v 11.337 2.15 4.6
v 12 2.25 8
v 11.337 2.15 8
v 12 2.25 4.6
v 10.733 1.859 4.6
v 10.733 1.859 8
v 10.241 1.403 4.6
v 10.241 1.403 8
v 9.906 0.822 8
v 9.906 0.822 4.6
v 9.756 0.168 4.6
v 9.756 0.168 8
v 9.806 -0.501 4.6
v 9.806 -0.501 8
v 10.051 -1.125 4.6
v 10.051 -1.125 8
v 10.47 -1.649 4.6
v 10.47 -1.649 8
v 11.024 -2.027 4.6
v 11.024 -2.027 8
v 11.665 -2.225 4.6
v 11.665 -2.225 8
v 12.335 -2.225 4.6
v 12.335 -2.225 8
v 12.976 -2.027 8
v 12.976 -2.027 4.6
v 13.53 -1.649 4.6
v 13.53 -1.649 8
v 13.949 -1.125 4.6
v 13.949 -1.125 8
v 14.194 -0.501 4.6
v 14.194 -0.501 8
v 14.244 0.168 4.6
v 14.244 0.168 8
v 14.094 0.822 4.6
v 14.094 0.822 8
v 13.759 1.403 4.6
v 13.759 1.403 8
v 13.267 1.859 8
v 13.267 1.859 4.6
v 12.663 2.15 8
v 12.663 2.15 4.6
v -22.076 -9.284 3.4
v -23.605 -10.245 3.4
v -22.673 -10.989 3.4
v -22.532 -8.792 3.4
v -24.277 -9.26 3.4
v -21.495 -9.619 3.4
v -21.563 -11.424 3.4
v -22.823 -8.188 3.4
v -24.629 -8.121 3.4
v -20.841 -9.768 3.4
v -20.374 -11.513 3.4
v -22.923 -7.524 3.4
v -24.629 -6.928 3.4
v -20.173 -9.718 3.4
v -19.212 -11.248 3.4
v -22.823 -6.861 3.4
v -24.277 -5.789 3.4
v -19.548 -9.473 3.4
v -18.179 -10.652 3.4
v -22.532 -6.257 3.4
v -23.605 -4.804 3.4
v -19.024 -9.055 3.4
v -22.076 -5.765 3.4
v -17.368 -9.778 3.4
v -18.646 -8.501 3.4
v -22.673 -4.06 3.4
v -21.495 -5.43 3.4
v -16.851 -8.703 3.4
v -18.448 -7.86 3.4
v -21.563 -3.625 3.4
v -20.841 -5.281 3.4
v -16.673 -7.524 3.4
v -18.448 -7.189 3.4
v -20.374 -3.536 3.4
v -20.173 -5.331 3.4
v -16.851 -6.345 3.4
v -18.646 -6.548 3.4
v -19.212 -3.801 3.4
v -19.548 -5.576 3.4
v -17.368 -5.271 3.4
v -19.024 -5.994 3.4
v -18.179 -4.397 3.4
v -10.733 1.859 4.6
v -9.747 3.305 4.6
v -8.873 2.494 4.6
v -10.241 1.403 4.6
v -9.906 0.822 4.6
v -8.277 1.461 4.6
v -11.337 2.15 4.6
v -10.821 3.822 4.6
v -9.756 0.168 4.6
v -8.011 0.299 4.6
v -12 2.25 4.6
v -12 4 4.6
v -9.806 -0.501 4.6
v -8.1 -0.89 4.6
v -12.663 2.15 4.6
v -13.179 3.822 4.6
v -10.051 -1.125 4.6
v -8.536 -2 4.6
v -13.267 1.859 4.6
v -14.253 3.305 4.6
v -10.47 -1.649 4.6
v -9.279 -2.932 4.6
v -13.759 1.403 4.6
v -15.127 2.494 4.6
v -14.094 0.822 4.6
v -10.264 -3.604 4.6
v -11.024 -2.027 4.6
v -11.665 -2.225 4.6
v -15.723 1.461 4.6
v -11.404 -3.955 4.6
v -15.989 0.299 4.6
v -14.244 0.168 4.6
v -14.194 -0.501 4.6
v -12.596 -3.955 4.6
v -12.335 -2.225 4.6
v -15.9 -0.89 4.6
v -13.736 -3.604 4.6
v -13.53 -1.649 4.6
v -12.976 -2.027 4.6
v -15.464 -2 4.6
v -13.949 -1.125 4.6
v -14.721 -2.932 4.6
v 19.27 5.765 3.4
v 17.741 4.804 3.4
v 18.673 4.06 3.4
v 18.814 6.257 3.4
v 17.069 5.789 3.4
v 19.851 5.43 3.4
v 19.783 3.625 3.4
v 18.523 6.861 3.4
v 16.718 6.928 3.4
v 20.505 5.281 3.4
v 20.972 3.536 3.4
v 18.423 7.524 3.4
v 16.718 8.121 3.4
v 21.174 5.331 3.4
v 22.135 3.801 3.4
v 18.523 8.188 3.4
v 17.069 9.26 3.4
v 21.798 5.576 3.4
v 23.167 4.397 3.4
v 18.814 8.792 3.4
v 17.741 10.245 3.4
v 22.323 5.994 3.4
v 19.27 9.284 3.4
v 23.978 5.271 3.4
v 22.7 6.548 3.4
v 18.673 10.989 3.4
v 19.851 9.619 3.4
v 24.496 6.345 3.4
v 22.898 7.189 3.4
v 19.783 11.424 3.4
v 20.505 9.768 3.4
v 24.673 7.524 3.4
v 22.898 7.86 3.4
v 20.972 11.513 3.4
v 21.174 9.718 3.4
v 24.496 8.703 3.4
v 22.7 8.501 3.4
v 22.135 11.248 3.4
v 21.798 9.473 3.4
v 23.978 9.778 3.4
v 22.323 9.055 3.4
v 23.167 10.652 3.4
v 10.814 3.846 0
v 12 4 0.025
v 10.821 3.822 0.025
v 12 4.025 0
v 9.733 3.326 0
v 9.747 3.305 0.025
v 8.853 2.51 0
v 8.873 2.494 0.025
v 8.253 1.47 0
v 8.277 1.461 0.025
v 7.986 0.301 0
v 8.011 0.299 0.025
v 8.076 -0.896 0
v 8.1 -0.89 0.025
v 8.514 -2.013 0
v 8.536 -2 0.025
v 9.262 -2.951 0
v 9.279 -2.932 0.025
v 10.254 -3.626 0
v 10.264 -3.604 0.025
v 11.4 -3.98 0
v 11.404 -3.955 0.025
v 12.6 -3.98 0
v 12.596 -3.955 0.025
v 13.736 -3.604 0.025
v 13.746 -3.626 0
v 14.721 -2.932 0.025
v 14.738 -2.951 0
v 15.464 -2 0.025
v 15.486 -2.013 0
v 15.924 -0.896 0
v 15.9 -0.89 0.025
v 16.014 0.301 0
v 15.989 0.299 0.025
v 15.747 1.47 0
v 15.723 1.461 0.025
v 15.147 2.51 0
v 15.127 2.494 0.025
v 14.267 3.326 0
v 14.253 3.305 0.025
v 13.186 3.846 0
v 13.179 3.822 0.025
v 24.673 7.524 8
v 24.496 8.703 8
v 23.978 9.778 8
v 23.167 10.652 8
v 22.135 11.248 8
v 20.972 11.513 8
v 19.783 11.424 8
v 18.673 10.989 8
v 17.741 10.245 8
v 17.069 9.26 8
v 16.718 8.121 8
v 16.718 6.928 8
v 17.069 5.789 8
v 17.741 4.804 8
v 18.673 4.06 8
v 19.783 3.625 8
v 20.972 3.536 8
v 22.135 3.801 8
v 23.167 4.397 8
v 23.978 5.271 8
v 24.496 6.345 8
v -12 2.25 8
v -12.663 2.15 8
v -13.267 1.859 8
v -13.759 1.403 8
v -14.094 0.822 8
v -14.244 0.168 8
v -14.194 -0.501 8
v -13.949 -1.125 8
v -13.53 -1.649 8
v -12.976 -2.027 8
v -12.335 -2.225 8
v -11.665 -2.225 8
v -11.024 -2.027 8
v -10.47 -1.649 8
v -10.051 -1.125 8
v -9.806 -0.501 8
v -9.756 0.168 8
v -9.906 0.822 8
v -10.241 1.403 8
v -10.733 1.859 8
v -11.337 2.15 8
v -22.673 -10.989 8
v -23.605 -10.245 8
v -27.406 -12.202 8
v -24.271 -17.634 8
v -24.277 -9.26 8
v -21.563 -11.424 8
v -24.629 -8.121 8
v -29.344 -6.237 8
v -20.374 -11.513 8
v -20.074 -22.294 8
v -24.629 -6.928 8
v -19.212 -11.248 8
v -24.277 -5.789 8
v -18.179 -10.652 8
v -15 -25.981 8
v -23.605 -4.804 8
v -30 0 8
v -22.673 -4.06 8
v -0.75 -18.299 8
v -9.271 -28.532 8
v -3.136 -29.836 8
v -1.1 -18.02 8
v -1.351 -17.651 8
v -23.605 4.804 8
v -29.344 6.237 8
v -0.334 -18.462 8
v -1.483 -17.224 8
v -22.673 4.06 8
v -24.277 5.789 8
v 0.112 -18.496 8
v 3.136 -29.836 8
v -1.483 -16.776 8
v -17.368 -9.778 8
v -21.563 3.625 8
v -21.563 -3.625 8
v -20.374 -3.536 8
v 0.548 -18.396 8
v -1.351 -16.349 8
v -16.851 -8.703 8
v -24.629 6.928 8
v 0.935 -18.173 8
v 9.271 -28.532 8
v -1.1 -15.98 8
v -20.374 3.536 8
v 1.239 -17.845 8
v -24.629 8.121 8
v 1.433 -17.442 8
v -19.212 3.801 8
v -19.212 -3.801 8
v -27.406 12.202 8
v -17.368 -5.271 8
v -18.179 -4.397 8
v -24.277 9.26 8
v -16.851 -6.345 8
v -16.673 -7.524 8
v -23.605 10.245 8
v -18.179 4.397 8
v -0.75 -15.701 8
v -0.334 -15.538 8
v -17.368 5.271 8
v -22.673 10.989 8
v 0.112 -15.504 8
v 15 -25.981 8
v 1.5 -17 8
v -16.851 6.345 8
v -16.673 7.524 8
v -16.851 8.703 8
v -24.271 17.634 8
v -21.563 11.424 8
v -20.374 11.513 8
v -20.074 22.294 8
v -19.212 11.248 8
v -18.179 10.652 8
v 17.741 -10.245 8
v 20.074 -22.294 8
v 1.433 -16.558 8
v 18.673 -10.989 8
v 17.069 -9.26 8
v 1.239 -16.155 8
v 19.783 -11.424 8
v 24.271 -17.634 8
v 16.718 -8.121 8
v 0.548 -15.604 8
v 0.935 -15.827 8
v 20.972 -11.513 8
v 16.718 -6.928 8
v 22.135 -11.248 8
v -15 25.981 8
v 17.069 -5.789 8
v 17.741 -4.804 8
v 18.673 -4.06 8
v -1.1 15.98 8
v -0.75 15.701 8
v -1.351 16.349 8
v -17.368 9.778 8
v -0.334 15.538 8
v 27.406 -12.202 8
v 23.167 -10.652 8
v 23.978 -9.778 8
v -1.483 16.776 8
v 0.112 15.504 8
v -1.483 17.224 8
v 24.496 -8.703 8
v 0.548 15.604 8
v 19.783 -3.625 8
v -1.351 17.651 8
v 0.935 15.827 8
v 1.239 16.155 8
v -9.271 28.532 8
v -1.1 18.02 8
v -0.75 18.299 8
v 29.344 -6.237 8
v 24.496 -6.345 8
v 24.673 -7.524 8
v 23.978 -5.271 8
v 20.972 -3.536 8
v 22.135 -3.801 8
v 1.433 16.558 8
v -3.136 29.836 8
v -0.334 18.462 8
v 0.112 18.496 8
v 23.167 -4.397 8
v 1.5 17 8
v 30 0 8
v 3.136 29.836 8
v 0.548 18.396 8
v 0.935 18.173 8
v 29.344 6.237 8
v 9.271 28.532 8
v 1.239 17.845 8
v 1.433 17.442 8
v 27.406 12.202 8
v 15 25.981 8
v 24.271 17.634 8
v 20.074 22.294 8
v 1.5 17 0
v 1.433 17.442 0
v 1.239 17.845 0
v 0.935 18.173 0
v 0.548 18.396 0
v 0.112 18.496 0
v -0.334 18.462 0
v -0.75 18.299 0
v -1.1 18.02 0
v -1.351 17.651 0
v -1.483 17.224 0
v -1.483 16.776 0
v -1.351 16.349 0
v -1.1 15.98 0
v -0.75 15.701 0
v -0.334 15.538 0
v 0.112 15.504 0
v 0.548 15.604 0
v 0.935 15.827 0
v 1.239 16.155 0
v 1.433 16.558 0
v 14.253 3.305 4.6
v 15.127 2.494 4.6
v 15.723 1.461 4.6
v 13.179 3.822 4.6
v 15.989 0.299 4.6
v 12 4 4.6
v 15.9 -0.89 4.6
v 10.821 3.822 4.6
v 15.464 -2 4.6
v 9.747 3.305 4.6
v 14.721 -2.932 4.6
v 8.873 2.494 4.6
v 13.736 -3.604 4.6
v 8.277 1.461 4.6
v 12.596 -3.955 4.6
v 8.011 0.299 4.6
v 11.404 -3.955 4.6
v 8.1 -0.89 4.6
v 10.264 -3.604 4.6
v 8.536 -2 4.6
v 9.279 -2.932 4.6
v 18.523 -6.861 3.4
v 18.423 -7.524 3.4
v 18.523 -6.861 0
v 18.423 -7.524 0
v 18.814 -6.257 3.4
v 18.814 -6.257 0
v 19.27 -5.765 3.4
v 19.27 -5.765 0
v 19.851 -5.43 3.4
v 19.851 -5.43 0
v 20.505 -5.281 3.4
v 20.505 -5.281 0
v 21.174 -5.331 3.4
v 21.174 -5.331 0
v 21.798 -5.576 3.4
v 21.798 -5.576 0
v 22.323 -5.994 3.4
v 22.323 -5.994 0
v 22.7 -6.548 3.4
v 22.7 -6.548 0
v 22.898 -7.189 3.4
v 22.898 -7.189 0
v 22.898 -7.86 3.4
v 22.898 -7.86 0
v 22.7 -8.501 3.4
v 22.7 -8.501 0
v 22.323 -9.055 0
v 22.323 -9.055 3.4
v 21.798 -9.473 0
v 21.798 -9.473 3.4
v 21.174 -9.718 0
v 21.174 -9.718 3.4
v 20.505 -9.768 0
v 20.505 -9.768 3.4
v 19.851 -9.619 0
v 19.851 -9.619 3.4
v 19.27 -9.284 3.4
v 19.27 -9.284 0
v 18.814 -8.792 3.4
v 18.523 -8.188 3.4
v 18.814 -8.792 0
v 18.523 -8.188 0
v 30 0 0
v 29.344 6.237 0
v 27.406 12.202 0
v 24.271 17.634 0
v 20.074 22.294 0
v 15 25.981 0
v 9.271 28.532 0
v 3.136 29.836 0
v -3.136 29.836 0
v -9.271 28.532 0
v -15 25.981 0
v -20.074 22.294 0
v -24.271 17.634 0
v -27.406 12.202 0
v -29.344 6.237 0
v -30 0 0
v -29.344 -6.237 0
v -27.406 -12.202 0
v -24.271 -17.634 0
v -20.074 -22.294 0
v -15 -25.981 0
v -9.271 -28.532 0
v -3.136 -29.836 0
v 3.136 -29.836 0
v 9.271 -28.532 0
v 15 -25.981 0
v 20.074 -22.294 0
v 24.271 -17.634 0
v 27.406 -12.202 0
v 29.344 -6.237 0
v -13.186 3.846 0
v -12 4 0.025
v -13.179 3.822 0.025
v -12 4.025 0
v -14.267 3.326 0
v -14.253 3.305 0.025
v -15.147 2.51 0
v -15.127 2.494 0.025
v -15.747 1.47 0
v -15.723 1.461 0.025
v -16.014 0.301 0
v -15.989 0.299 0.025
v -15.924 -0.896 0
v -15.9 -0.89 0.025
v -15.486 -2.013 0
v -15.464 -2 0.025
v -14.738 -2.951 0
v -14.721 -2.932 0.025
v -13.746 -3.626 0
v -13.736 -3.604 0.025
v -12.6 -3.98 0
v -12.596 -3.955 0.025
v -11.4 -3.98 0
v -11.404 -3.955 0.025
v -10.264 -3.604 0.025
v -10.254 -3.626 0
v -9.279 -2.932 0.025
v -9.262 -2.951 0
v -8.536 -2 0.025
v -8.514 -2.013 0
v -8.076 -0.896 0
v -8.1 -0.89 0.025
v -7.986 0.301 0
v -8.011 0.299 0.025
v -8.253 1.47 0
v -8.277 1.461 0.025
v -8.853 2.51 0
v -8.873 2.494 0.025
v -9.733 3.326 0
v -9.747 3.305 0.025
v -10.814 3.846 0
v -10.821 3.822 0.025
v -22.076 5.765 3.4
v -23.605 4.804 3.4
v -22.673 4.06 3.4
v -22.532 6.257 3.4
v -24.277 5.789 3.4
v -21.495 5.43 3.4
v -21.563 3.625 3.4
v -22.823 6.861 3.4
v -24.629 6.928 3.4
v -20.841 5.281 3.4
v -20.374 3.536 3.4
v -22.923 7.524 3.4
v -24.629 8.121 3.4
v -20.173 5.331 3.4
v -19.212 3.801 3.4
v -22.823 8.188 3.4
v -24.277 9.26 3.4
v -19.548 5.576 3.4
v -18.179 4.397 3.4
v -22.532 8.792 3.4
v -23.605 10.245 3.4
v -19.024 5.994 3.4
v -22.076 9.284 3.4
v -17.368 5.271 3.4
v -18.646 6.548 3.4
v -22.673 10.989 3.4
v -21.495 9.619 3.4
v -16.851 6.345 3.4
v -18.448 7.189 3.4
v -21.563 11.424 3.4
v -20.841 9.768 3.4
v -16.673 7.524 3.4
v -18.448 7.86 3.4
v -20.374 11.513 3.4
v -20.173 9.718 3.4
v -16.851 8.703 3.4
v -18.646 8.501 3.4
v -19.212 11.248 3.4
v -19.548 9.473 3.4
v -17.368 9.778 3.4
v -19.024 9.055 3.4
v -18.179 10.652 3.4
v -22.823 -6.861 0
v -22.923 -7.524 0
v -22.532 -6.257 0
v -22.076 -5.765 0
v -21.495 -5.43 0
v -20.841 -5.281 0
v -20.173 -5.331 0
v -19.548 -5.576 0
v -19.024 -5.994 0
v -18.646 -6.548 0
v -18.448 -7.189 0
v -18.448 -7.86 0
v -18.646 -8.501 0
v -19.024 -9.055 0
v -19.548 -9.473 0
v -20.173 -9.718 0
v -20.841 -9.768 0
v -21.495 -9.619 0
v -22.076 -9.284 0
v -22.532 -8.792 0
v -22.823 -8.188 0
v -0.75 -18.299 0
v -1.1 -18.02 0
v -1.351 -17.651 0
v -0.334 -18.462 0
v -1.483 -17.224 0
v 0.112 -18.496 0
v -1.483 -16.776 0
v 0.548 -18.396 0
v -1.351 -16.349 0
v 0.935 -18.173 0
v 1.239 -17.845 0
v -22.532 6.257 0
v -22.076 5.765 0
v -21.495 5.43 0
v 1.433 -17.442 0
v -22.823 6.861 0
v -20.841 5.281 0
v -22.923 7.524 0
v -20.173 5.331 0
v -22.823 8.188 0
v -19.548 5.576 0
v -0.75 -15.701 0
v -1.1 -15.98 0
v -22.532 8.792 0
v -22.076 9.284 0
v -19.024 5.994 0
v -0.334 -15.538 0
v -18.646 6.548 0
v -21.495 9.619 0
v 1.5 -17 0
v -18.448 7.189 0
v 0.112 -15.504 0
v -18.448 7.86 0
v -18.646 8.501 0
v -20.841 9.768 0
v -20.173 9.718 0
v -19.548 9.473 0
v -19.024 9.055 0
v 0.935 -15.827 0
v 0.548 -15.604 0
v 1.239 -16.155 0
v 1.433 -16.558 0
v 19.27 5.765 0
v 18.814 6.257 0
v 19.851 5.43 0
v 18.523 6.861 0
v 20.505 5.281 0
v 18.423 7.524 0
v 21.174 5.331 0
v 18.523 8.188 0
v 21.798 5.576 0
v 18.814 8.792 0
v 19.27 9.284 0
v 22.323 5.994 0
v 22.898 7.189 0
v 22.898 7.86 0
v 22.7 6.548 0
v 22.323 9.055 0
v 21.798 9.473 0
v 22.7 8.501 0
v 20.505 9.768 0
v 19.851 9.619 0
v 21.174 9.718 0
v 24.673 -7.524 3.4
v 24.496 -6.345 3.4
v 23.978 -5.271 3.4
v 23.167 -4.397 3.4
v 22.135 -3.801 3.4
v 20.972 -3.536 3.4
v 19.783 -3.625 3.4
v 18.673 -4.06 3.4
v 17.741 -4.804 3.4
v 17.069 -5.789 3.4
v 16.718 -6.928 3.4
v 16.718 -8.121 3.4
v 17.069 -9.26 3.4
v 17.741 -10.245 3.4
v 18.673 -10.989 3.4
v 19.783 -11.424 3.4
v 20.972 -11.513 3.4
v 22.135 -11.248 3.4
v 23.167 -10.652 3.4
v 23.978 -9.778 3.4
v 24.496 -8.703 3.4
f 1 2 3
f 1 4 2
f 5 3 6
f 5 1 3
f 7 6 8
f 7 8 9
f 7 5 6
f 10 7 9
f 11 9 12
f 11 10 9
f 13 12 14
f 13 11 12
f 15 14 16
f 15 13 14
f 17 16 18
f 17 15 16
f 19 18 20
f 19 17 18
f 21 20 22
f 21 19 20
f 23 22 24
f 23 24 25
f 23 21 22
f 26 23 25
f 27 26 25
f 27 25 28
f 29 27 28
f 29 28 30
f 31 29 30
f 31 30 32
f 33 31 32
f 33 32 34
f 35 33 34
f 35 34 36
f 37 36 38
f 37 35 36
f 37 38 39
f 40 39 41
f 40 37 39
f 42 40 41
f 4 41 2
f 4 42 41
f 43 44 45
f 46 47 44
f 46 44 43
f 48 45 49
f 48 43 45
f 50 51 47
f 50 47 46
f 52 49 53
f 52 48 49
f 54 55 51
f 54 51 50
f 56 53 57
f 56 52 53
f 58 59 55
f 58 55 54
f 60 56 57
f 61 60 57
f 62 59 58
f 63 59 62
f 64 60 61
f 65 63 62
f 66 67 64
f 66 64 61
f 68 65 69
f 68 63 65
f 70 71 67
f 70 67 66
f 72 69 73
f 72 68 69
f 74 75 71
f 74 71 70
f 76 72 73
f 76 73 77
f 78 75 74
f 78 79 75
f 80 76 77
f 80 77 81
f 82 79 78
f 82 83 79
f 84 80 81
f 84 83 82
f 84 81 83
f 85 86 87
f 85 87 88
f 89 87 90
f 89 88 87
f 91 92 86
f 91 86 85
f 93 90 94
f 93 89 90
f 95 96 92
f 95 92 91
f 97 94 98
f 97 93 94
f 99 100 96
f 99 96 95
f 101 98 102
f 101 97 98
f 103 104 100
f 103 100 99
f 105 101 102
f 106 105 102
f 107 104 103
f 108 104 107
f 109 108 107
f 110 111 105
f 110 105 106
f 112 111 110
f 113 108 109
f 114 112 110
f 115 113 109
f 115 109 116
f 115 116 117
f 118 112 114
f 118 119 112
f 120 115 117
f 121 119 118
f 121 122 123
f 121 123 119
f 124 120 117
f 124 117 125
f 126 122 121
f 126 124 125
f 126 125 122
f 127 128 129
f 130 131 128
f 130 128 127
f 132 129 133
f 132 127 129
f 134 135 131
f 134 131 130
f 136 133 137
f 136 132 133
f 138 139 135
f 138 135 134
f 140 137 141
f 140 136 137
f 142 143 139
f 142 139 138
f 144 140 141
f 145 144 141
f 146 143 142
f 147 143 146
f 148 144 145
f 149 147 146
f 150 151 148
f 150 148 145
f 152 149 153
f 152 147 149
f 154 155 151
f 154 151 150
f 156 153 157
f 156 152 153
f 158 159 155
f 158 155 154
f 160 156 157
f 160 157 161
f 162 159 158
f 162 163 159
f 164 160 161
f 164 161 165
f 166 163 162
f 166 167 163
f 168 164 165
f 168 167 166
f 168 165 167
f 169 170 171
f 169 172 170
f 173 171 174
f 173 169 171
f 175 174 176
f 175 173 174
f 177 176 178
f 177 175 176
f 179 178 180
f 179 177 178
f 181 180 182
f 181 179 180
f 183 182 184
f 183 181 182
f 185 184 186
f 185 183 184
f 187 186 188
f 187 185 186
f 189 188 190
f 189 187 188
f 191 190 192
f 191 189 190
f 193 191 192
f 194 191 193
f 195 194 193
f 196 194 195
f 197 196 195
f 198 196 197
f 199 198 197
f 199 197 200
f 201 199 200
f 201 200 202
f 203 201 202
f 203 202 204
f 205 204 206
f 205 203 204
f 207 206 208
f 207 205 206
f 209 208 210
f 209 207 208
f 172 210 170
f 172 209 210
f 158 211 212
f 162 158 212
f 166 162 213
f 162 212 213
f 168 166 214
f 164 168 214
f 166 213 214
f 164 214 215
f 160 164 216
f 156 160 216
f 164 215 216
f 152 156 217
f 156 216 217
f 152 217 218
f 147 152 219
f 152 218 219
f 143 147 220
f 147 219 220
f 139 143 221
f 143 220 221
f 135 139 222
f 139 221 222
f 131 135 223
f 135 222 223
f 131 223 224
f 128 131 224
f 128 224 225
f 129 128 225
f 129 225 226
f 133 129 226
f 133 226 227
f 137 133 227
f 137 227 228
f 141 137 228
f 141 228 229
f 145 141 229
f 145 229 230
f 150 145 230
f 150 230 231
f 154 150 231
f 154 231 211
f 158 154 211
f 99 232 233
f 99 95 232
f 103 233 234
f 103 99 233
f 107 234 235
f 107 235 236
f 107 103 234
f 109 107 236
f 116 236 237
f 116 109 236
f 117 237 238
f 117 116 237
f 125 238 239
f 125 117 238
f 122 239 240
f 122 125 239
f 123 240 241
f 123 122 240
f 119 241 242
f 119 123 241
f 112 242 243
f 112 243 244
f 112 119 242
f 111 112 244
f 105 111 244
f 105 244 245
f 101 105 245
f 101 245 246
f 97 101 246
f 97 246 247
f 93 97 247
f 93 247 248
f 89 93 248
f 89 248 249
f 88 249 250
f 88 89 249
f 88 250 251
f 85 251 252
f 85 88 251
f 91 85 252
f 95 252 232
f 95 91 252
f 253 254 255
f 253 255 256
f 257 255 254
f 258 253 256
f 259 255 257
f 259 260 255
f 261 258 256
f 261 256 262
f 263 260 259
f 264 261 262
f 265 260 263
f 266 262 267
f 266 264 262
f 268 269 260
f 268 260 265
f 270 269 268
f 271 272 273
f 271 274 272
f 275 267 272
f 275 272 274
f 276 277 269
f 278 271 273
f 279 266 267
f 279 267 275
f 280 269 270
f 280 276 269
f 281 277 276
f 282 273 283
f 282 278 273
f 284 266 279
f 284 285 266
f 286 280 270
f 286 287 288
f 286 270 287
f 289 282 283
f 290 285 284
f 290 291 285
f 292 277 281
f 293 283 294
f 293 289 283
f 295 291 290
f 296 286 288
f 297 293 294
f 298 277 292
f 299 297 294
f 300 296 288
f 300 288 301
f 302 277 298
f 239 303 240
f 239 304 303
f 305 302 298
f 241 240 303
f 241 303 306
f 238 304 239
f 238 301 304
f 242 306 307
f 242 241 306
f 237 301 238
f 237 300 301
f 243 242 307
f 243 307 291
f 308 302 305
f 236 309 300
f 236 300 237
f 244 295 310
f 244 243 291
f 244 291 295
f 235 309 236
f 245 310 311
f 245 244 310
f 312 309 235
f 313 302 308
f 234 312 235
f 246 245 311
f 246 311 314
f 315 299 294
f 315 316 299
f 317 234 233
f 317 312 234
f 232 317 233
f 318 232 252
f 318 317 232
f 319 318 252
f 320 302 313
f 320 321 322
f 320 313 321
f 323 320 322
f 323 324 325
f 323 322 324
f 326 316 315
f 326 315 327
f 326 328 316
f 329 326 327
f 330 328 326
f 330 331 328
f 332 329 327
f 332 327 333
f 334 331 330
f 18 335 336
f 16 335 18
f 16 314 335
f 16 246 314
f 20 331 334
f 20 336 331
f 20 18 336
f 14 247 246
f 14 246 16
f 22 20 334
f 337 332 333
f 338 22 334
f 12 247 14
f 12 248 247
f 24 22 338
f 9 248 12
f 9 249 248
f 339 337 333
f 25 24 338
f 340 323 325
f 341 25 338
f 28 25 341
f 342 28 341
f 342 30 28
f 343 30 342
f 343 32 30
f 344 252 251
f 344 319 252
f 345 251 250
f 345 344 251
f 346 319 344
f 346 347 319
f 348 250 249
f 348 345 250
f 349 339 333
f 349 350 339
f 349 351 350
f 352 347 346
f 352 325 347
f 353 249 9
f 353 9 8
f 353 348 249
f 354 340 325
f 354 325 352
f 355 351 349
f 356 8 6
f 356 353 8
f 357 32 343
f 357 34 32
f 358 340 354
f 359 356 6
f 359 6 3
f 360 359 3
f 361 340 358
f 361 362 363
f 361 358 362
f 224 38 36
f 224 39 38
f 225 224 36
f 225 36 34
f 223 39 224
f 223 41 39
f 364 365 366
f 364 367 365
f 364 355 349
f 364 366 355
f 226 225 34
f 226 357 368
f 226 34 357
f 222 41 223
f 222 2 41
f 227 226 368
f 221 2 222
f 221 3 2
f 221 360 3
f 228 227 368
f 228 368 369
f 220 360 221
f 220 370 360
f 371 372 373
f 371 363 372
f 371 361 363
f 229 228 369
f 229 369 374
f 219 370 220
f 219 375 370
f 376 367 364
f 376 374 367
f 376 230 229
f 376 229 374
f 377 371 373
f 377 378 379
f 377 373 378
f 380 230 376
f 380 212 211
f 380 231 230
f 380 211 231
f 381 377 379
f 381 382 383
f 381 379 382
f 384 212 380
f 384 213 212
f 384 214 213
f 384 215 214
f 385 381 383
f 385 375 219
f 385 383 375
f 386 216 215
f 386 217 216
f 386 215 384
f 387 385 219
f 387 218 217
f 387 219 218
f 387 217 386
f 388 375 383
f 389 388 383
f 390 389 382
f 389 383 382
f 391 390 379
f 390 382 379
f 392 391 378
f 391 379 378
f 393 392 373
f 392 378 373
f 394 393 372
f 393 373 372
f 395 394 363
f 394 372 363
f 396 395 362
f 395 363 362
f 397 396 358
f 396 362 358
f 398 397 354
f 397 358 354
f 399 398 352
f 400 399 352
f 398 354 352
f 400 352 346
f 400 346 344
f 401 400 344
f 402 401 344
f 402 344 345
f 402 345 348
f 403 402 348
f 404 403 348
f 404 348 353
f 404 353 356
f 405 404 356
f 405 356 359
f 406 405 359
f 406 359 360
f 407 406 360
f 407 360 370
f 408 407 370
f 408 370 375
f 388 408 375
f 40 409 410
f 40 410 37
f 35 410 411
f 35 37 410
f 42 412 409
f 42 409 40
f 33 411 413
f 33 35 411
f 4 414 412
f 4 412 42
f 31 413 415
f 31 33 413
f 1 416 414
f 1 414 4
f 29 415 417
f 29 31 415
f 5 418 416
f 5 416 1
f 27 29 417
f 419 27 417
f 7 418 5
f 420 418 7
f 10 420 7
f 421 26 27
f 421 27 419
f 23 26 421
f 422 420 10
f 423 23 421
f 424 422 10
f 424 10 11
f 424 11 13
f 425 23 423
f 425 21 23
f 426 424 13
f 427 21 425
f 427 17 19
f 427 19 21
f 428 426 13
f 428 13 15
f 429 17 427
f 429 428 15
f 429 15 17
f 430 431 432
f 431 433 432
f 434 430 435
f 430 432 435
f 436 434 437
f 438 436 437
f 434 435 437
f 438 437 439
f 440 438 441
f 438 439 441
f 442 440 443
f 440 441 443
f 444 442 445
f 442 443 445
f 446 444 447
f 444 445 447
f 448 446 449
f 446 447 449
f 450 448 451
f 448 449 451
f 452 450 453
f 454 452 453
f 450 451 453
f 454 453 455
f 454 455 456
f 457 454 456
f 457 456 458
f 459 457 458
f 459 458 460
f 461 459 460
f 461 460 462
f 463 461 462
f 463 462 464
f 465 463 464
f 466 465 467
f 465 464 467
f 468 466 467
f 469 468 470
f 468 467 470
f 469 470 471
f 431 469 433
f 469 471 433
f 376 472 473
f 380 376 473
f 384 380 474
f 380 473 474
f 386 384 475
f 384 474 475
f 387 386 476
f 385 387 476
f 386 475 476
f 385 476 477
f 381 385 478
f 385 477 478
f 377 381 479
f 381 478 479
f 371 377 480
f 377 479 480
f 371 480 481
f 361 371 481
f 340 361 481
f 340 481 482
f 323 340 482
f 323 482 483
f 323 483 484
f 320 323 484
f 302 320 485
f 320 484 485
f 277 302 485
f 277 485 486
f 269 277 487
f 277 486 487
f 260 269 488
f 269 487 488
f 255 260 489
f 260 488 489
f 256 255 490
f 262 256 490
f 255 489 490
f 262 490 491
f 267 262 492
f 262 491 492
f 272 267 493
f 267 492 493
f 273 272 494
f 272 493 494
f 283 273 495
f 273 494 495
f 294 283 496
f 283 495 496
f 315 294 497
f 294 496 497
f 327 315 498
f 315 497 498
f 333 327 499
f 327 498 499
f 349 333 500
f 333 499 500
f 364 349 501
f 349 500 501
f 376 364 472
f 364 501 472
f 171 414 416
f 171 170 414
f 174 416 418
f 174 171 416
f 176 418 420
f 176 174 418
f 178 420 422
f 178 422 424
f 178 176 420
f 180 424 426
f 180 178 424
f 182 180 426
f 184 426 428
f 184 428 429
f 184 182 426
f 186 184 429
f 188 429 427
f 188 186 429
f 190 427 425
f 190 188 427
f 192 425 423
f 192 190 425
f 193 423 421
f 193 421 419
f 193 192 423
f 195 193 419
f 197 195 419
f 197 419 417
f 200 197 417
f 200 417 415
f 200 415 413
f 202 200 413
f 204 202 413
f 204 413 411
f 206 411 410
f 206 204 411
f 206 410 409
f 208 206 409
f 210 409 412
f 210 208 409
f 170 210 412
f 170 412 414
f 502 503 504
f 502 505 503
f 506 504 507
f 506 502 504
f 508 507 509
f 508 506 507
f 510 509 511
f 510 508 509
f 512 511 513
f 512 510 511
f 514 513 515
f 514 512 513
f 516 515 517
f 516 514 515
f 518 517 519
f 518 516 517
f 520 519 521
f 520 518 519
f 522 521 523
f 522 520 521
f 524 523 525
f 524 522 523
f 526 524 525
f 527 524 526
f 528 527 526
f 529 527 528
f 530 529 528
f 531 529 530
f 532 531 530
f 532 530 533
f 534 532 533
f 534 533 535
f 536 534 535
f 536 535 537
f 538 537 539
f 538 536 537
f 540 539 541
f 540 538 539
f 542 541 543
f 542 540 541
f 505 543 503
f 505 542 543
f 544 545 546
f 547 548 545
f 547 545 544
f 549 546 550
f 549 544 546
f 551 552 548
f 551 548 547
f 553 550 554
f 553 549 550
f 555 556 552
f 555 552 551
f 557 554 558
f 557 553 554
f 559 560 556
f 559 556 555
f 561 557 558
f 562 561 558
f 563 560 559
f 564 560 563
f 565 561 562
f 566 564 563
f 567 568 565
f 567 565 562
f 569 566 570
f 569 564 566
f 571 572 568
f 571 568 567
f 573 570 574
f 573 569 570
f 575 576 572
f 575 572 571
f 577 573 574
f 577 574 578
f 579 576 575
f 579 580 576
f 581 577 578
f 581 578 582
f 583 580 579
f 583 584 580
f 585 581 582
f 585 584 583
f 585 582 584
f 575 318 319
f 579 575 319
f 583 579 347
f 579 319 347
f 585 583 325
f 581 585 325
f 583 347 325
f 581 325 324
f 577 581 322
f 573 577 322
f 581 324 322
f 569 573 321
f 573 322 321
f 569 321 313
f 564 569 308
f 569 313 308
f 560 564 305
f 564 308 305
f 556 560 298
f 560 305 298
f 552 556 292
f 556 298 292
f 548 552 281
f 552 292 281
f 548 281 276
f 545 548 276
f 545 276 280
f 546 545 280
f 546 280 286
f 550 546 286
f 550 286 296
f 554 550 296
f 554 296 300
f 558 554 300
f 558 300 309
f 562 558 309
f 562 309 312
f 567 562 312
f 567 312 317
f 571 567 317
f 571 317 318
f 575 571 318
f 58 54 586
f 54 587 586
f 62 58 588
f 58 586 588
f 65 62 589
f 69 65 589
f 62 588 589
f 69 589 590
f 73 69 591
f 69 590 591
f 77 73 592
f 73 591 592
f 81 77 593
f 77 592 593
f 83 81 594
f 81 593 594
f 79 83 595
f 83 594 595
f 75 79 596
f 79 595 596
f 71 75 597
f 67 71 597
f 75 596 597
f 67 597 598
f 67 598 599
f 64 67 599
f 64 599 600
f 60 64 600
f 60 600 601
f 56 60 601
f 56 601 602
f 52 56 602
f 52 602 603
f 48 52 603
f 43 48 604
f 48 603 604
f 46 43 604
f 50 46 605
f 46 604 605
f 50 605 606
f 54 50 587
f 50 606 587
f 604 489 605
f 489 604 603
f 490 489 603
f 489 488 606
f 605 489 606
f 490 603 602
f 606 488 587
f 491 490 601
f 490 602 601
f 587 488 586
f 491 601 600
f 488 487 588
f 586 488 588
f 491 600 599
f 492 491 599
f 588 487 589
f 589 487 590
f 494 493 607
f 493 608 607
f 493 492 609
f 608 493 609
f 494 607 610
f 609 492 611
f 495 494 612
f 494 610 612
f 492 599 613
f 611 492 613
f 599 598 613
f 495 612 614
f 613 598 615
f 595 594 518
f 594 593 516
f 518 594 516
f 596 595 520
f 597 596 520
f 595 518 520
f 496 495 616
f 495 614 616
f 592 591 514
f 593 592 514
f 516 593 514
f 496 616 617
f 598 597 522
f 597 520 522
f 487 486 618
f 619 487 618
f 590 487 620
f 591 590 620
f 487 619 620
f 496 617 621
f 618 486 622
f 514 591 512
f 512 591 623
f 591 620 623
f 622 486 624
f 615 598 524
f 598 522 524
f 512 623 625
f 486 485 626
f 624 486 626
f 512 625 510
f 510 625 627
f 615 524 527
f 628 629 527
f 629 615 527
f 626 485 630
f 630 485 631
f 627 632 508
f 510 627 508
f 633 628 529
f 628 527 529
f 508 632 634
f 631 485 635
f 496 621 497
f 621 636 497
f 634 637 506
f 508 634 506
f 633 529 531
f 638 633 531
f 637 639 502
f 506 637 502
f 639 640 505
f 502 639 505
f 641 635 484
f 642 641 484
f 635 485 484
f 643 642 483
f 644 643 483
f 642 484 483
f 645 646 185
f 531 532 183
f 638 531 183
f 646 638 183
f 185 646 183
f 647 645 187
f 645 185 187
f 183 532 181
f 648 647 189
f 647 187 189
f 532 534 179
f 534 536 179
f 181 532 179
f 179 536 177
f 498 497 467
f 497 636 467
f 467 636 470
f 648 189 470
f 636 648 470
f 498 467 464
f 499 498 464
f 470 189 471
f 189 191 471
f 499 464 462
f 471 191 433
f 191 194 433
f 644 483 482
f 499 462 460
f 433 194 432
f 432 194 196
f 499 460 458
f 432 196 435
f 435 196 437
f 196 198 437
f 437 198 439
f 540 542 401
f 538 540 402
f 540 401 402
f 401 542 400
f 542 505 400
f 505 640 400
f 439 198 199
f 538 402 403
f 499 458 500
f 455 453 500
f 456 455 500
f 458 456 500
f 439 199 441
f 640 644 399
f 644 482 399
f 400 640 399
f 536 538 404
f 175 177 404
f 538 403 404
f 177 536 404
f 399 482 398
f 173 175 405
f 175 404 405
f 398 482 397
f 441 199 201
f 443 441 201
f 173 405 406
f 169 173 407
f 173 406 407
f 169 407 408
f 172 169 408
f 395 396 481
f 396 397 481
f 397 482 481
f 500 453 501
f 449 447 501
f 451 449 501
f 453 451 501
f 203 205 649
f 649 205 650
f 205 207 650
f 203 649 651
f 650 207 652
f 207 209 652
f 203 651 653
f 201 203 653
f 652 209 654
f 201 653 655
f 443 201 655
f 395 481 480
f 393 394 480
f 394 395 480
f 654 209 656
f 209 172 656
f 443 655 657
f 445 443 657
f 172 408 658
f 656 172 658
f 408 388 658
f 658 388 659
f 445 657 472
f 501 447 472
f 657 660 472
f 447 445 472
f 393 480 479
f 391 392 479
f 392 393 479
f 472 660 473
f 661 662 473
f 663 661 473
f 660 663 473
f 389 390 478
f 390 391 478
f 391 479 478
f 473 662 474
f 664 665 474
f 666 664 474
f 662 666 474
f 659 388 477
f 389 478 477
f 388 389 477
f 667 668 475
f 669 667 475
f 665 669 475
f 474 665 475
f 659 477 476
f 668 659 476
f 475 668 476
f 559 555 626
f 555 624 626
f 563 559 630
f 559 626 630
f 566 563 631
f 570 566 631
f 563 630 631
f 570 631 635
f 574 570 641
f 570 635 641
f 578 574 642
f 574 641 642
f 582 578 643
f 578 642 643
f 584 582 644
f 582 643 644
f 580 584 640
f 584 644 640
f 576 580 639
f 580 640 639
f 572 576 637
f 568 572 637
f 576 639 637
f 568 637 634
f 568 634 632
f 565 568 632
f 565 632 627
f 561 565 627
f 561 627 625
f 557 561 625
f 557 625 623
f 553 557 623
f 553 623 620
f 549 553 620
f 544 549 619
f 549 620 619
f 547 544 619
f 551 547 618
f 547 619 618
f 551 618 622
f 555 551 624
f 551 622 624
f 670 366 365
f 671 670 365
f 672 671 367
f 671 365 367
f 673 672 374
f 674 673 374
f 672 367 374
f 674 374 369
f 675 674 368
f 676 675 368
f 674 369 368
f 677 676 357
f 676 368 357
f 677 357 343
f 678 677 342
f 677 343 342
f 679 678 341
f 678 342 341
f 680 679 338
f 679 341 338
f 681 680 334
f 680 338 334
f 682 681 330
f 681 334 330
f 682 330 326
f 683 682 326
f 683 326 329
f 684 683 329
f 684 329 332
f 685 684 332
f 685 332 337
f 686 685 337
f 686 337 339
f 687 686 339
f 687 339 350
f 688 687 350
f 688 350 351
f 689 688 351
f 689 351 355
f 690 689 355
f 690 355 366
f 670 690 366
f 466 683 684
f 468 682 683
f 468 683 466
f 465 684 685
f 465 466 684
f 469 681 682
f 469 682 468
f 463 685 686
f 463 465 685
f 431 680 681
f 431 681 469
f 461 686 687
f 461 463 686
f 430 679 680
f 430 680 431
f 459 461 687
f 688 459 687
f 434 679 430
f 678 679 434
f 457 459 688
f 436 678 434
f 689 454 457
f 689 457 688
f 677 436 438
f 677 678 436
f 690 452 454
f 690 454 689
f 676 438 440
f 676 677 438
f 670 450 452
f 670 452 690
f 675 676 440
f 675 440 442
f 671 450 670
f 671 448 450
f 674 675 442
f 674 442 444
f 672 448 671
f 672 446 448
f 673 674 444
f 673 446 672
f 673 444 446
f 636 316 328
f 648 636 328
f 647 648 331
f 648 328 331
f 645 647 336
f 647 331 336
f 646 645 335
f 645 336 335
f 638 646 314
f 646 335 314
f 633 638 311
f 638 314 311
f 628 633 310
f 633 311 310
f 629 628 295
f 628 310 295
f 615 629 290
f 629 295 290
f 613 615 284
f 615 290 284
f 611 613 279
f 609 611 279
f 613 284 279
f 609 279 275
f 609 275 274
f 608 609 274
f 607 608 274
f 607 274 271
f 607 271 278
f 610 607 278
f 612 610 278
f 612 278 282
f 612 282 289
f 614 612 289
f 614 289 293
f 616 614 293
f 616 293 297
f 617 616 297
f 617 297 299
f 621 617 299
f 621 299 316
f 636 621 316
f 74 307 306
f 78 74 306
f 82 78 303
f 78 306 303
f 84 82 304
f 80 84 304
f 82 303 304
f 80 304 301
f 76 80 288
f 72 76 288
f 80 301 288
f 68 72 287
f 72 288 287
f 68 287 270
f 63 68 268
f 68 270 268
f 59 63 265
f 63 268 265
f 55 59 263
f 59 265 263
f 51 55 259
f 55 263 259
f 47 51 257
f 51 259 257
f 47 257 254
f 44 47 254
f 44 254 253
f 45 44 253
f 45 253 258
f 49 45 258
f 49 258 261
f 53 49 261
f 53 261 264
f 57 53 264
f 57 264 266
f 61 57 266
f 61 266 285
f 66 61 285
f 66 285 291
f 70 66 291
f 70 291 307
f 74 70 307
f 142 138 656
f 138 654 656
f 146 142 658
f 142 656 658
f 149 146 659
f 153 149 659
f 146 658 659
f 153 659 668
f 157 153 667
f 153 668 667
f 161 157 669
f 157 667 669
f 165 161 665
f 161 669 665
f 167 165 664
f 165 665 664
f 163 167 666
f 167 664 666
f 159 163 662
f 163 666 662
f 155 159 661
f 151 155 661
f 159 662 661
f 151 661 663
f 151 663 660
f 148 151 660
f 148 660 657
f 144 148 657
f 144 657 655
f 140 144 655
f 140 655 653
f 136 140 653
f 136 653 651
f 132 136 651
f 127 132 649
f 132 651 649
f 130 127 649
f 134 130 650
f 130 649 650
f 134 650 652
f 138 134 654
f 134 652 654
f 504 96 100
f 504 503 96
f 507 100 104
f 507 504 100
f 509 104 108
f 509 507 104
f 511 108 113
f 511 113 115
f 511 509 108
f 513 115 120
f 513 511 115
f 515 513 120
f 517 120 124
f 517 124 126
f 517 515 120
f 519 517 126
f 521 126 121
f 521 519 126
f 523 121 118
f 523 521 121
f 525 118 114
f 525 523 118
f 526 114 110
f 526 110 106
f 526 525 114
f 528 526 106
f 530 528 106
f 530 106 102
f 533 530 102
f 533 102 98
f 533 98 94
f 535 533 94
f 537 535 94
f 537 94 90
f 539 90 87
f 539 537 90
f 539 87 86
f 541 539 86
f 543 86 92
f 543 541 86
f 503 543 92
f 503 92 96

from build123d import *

# Parameters (mm, degrees)
SKETCH_1_R                = 30
EXTRUDE_1_DEPTH           = 8
HOLE_WIZARD_2_AT_2_COUNT  = 2
HOLE_WIZARD_2_AT_2_PITCH  = 24
MM_1_D                    = 3
HOLE_WIZARD_3_D           = 4.5
HOLE_WIZARD_3_CBORE_D     = 8
HOLE_WIZARD_3_CBORE_DEPTH = 4.6


with BuildPart() as part:
    # 草图1 → 凸台-拉伸1 (new body)
    with BuildSketch(Plane.XY):
        Circle(SKETCH_1_R)
    extrude(amount=EXTRUDE_1_DEPTH)

    # 草图10 → 打孔尺寸(%根据)内六角圆柱头螺钉的类型2 (revolve, cut)
    with BuildSketch(Plane.YZ.offset(12)):
        Polygon((0, 0), (0, 8), (2.25, 8), (2.25, 4.6), (4, 4.6), (4, 0.025), (4.025, 0), align=None)
    hole_wizard_2 = revolve(axis=Axis((12, 0, -6.35), (0, 0, 1)), mode=Mode.SUBTRACT)

    # 打孔尺寸(%根据)内六角圆柱头螺钉的类型2 at 2: 打孔尺寸(%根据)内六角圆柱头螺钉的类型2 ×2
    with Locations(*[(-i * HOLE_WIZARD_2_AT_2_PITCH, 0, 0) for i in range(1, HOLE_WIZARD_2_AT_2_COUNT)]):
        add(hole_wizard_2, mode=Mode.SUBTRACT)

    # 大小mm 暗销孔1 (through all)
    with Locations(Plane(origin=(0, 0, 0), x_dir=(-1, 0, 0), z_dir=(0, 0, -1))):
        with Locations((0, -17), (0, 17)):
            Hole(MM_1_D / 2)

    # 打孔尺寸(%根据)内六角圆柱头螺钉的类型3 (through all)
    with Locations(Plane.XY.offset(8)):
        with Locations((-20.673237657, 7.524443153), (-20.673237657, -7.524443153), (20.673237657, 7.524443153), (20.673237657, -7.524443153)):
            CounterBoreHole(HOLE_WIZARD_3_D / 2, HOLE_WIZARD_3_CBORE_D / 2, HOLE_WIZARD_3_CBORE_DEPTH)


solid = part.part
